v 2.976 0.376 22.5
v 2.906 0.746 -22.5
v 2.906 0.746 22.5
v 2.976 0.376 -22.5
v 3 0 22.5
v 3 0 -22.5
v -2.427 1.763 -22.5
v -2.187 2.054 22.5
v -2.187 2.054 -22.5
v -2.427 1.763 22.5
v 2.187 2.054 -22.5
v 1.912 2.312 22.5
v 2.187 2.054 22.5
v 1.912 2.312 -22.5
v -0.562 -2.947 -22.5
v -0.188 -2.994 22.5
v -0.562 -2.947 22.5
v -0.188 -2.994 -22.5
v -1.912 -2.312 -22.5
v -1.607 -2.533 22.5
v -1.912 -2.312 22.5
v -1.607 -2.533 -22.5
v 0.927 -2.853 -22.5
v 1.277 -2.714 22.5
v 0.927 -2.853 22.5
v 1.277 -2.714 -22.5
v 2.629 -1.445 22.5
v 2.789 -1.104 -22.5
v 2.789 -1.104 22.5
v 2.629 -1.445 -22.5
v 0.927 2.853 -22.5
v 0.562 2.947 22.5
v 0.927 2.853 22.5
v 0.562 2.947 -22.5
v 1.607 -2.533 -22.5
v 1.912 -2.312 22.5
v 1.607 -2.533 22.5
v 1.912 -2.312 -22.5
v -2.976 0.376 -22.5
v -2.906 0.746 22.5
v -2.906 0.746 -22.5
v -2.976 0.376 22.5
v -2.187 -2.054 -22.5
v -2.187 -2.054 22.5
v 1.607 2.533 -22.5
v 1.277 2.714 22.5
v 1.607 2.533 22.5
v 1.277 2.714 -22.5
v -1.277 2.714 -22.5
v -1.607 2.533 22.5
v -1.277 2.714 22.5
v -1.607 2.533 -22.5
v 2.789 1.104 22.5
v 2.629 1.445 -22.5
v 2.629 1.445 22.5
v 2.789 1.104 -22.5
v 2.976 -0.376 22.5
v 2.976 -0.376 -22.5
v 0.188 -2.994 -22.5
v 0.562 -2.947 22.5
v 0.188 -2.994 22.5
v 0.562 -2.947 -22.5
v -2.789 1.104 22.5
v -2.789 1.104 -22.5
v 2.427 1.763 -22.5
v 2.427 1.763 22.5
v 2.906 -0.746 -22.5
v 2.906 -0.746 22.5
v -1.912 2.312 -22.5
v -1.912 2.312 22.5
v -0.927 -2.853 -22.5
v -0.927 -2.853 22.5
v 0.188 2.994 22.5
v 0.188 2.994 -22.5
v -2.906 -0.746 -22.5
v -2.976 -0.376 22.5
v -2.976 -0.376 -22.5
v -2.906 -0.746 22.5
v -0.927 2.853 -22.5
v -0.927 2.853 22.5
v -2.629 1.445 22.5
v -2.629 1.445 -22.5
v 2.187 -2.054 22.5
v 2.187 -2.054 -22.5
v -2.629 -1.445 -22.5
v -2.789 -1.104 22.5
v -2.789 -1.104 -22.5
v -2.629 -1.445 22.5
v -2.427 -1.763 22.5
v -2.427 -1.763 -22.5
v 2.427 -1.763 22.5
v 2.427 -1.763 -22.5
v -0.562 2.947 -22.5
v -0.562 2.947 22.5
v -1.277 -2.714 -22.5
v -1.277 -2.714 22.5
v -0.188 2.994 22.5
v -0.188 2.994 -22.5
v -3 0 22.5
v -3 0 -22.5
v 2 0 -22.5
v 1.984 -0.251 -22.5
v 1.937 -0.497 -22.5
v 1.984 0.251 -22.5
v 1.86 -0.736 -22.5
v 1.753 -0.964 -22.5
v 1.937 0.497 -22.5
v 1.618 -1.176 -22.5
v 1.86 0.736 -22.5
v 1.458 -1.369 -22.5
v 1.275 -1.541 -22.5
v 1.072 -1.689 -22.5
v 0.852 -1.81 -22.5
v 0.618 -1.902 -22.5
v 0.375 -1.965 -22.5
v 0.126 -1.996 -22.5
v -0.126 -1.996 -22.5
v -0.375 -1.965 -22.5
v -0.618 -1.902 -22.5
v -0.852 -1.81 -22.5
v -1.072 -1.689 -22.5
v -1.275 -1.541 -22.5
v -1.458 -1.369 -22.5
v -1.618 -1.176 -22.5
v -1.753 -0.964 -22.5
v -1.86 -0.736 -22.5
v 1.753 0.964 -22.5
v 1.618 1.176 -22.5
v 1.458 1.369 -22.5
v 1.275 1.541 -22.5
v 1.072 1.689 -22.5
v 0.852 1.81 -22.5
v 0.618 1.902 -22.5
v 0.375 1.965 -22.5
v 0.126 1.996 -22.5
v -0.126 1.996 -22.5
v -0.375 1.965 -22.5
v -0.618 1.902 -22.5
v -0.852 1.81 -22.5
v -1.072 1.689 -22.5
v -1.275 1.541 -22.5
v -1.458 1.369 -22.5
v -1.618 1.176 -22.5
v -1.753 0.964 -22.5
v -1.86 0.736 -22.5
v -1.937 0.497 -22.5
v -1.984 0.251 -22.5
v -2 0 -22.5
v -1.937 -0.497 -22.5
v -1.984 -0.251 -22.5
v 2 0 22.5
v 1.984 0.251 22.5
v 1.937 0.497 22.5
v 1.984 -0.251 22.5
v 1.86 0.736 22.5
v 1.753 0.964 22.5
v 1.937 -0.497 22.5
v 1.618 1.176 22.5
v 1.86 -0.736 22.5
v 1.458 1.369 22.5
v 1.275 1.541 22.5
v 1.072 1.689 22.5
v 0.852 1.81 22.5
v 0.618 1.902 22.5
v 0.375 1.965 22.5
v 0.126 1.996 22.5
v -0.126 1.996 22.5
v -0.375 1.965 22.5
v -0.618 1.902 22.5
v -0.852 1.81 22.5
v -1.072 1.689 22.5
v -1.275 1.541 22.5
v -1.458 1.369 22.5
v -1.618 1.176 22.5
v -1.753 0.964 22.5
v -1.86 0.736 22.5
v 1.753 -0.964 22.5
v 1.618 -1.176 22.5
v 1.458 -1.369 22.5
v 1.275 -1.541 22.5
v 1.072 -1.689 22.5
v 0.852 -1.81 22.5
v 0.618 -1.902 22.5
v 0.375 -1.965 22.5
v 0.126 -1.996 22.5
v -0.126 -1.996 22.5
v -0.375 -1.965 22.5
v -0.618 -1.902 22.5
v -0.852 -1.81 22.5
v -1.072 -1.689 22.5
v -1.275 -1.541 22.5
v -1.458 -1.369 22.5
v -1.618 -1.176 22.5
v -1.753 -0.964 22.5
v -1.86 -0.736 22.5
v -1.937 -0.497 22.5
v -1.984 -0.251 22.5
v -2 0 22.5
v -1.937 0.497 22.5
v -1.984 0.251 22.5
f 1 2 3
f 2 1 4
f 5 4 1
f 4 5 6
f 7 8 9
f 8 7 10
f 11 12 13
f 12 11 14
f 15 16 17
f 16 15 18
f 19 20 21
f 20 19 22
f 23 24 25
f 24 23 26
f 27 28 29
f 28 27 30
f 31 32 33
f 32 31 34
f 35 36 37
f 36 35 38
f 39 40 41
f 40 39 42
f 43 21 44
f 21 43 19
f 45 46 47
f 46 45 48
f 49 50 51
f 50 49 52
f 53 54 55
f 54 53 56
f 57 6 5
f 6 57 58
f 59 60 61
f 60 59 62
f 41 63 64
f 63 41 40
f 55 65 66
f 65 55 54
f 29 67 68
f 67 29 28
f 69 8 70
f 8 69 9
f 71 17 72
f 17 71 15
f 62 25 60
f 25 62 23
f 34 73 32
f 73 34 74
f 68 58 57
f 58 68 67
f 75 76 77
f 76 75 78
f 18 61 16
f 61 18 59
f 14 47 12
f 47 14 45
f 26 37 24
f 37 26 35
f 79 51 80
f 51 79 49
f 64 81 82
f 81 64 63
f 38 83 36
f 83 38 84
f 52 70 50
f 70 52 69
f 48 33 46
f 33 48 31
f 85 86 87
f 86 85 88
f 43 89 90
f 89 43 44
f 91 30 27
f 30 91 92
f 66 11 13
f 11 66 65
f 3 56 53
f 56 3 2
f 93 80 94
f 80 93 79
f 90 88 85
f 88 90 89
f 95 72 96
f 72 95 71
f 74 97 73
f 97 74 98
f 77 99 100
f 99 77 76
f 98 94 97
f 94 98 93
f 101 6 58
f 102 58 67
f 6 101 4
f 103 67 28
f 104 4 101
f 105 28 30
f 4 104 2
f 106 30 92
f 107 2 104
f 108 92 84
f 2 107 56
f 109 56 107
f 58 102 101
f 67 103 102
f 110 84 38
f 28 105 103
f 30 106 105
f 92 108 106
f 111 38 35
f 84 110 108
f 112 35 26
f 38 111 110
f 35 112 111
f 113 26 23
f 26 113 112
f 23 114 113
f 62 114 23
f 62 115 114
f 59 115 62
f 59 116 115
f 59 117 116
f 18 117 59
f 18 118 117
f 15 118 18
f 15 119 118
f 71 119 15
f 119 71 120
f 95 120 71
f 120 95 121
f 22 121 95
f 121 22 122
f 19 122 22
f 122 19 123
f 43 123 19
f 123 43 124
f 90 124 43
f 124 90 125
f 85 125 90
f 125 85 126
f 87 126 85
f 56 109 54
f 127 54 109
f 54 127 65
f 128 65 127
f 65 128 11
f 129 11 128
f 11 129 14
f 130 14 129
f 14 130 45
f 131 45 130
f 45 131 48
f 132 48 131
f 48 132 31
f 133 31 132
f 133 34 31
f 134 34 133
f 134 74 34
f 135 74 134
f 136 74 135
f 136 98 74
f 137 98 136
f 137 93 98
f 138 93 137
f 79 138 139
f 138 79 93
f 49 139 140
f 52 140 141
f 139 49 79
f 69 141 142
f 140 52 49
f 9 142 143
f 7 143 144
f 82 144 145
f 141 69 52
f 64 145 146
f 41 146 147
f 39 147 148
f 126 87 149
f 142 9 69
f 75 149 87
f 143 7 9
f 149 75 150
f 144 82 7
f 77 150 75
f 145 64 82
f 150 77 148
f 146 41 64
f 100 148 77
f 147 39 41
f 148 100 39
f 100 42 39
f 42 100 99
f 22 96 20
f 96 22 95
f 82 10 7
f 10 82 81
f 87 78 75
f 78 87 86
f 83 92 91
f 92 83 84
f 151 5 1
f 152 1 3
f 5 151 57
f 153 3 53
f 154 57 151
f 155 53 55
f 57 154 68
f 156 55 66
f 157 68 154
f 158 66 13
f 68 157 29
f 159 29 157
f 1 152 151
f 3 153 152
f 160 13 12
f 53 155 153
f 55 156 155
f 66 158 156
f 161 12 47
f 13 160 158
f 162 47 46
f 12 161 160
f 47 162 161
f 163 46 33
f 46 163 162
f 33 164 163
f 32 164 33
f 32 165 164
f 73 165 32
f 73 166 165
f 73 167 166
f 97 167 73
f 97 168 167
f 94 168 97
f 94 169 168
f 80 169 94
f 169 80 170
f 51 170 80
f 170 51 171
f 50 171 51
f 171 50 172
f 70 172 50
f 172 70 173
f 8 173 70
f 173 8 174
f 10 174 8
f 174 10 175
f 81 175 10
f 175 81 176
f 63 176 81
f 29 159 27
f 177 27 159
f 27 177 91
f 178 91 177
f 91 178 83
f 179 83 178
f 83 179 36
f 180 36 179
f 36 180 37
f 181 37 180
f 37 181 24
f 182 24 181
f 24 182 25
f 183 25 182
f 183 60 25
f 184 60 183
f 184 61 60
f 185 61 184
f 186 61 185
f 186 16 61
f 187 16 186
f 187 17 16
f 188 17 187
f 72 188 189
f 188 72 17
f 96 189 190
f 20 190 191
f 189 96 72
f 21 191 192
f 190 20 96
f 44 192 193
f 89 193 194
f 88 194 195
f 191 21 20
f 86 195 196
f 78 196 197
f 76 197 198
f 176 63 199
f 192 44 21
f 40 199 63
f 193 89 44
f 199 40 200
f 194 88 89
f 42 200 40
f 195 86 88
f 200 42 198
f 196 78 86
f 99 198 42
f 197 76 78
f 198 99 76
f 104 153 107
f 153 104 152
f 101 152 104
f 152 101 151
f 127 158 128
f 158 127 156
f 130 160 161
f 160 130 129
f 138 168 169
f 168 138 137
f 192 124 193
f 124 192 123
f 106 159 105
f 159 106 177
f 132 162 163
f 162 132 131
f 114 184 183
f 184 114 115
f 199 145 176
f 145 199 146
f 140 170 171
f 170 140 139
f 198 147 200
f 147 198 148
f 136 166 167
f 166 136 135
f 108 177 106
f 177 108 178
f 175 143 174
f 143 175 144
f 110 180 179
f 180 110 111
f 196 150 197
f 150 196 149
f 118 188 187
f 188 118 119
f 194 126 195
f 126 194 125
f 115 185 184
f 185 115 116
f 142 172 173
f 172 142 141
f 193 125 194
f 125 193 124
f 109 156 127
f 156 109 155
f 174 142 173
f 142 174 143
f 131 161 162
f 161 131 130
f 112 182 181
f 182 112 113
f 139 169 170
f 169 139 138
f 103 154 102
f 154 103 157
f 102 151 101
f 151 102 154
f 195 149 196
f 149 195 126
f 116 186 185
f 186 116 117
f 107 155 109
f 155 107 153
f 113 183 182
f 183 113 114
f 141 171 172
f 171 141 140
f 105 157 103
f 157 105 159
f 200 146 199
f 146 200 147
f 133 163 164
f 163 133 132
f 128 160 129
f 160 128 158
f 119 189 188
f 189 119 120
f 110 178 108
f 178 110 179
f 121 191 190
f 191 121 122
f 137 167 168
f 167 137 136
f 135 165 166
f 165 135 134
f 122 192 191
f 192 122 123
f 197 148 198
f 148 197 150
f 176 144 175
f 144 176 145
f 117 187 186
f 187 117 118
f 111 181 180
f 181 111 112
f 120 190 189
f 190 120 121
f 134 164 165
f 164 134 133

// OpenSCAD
$fn = 50;


difference() {
	union() {
		translate(v = [0, 0, -22.5000000000]) {
			cylinder(h = 45, r = 3.0000000000);
		}
	}
	union() {
		translate(v = [0, 0, -100.0000000000]) {
			cylinder(h = 200, r = 2.0000000000);
		}
	}
}
